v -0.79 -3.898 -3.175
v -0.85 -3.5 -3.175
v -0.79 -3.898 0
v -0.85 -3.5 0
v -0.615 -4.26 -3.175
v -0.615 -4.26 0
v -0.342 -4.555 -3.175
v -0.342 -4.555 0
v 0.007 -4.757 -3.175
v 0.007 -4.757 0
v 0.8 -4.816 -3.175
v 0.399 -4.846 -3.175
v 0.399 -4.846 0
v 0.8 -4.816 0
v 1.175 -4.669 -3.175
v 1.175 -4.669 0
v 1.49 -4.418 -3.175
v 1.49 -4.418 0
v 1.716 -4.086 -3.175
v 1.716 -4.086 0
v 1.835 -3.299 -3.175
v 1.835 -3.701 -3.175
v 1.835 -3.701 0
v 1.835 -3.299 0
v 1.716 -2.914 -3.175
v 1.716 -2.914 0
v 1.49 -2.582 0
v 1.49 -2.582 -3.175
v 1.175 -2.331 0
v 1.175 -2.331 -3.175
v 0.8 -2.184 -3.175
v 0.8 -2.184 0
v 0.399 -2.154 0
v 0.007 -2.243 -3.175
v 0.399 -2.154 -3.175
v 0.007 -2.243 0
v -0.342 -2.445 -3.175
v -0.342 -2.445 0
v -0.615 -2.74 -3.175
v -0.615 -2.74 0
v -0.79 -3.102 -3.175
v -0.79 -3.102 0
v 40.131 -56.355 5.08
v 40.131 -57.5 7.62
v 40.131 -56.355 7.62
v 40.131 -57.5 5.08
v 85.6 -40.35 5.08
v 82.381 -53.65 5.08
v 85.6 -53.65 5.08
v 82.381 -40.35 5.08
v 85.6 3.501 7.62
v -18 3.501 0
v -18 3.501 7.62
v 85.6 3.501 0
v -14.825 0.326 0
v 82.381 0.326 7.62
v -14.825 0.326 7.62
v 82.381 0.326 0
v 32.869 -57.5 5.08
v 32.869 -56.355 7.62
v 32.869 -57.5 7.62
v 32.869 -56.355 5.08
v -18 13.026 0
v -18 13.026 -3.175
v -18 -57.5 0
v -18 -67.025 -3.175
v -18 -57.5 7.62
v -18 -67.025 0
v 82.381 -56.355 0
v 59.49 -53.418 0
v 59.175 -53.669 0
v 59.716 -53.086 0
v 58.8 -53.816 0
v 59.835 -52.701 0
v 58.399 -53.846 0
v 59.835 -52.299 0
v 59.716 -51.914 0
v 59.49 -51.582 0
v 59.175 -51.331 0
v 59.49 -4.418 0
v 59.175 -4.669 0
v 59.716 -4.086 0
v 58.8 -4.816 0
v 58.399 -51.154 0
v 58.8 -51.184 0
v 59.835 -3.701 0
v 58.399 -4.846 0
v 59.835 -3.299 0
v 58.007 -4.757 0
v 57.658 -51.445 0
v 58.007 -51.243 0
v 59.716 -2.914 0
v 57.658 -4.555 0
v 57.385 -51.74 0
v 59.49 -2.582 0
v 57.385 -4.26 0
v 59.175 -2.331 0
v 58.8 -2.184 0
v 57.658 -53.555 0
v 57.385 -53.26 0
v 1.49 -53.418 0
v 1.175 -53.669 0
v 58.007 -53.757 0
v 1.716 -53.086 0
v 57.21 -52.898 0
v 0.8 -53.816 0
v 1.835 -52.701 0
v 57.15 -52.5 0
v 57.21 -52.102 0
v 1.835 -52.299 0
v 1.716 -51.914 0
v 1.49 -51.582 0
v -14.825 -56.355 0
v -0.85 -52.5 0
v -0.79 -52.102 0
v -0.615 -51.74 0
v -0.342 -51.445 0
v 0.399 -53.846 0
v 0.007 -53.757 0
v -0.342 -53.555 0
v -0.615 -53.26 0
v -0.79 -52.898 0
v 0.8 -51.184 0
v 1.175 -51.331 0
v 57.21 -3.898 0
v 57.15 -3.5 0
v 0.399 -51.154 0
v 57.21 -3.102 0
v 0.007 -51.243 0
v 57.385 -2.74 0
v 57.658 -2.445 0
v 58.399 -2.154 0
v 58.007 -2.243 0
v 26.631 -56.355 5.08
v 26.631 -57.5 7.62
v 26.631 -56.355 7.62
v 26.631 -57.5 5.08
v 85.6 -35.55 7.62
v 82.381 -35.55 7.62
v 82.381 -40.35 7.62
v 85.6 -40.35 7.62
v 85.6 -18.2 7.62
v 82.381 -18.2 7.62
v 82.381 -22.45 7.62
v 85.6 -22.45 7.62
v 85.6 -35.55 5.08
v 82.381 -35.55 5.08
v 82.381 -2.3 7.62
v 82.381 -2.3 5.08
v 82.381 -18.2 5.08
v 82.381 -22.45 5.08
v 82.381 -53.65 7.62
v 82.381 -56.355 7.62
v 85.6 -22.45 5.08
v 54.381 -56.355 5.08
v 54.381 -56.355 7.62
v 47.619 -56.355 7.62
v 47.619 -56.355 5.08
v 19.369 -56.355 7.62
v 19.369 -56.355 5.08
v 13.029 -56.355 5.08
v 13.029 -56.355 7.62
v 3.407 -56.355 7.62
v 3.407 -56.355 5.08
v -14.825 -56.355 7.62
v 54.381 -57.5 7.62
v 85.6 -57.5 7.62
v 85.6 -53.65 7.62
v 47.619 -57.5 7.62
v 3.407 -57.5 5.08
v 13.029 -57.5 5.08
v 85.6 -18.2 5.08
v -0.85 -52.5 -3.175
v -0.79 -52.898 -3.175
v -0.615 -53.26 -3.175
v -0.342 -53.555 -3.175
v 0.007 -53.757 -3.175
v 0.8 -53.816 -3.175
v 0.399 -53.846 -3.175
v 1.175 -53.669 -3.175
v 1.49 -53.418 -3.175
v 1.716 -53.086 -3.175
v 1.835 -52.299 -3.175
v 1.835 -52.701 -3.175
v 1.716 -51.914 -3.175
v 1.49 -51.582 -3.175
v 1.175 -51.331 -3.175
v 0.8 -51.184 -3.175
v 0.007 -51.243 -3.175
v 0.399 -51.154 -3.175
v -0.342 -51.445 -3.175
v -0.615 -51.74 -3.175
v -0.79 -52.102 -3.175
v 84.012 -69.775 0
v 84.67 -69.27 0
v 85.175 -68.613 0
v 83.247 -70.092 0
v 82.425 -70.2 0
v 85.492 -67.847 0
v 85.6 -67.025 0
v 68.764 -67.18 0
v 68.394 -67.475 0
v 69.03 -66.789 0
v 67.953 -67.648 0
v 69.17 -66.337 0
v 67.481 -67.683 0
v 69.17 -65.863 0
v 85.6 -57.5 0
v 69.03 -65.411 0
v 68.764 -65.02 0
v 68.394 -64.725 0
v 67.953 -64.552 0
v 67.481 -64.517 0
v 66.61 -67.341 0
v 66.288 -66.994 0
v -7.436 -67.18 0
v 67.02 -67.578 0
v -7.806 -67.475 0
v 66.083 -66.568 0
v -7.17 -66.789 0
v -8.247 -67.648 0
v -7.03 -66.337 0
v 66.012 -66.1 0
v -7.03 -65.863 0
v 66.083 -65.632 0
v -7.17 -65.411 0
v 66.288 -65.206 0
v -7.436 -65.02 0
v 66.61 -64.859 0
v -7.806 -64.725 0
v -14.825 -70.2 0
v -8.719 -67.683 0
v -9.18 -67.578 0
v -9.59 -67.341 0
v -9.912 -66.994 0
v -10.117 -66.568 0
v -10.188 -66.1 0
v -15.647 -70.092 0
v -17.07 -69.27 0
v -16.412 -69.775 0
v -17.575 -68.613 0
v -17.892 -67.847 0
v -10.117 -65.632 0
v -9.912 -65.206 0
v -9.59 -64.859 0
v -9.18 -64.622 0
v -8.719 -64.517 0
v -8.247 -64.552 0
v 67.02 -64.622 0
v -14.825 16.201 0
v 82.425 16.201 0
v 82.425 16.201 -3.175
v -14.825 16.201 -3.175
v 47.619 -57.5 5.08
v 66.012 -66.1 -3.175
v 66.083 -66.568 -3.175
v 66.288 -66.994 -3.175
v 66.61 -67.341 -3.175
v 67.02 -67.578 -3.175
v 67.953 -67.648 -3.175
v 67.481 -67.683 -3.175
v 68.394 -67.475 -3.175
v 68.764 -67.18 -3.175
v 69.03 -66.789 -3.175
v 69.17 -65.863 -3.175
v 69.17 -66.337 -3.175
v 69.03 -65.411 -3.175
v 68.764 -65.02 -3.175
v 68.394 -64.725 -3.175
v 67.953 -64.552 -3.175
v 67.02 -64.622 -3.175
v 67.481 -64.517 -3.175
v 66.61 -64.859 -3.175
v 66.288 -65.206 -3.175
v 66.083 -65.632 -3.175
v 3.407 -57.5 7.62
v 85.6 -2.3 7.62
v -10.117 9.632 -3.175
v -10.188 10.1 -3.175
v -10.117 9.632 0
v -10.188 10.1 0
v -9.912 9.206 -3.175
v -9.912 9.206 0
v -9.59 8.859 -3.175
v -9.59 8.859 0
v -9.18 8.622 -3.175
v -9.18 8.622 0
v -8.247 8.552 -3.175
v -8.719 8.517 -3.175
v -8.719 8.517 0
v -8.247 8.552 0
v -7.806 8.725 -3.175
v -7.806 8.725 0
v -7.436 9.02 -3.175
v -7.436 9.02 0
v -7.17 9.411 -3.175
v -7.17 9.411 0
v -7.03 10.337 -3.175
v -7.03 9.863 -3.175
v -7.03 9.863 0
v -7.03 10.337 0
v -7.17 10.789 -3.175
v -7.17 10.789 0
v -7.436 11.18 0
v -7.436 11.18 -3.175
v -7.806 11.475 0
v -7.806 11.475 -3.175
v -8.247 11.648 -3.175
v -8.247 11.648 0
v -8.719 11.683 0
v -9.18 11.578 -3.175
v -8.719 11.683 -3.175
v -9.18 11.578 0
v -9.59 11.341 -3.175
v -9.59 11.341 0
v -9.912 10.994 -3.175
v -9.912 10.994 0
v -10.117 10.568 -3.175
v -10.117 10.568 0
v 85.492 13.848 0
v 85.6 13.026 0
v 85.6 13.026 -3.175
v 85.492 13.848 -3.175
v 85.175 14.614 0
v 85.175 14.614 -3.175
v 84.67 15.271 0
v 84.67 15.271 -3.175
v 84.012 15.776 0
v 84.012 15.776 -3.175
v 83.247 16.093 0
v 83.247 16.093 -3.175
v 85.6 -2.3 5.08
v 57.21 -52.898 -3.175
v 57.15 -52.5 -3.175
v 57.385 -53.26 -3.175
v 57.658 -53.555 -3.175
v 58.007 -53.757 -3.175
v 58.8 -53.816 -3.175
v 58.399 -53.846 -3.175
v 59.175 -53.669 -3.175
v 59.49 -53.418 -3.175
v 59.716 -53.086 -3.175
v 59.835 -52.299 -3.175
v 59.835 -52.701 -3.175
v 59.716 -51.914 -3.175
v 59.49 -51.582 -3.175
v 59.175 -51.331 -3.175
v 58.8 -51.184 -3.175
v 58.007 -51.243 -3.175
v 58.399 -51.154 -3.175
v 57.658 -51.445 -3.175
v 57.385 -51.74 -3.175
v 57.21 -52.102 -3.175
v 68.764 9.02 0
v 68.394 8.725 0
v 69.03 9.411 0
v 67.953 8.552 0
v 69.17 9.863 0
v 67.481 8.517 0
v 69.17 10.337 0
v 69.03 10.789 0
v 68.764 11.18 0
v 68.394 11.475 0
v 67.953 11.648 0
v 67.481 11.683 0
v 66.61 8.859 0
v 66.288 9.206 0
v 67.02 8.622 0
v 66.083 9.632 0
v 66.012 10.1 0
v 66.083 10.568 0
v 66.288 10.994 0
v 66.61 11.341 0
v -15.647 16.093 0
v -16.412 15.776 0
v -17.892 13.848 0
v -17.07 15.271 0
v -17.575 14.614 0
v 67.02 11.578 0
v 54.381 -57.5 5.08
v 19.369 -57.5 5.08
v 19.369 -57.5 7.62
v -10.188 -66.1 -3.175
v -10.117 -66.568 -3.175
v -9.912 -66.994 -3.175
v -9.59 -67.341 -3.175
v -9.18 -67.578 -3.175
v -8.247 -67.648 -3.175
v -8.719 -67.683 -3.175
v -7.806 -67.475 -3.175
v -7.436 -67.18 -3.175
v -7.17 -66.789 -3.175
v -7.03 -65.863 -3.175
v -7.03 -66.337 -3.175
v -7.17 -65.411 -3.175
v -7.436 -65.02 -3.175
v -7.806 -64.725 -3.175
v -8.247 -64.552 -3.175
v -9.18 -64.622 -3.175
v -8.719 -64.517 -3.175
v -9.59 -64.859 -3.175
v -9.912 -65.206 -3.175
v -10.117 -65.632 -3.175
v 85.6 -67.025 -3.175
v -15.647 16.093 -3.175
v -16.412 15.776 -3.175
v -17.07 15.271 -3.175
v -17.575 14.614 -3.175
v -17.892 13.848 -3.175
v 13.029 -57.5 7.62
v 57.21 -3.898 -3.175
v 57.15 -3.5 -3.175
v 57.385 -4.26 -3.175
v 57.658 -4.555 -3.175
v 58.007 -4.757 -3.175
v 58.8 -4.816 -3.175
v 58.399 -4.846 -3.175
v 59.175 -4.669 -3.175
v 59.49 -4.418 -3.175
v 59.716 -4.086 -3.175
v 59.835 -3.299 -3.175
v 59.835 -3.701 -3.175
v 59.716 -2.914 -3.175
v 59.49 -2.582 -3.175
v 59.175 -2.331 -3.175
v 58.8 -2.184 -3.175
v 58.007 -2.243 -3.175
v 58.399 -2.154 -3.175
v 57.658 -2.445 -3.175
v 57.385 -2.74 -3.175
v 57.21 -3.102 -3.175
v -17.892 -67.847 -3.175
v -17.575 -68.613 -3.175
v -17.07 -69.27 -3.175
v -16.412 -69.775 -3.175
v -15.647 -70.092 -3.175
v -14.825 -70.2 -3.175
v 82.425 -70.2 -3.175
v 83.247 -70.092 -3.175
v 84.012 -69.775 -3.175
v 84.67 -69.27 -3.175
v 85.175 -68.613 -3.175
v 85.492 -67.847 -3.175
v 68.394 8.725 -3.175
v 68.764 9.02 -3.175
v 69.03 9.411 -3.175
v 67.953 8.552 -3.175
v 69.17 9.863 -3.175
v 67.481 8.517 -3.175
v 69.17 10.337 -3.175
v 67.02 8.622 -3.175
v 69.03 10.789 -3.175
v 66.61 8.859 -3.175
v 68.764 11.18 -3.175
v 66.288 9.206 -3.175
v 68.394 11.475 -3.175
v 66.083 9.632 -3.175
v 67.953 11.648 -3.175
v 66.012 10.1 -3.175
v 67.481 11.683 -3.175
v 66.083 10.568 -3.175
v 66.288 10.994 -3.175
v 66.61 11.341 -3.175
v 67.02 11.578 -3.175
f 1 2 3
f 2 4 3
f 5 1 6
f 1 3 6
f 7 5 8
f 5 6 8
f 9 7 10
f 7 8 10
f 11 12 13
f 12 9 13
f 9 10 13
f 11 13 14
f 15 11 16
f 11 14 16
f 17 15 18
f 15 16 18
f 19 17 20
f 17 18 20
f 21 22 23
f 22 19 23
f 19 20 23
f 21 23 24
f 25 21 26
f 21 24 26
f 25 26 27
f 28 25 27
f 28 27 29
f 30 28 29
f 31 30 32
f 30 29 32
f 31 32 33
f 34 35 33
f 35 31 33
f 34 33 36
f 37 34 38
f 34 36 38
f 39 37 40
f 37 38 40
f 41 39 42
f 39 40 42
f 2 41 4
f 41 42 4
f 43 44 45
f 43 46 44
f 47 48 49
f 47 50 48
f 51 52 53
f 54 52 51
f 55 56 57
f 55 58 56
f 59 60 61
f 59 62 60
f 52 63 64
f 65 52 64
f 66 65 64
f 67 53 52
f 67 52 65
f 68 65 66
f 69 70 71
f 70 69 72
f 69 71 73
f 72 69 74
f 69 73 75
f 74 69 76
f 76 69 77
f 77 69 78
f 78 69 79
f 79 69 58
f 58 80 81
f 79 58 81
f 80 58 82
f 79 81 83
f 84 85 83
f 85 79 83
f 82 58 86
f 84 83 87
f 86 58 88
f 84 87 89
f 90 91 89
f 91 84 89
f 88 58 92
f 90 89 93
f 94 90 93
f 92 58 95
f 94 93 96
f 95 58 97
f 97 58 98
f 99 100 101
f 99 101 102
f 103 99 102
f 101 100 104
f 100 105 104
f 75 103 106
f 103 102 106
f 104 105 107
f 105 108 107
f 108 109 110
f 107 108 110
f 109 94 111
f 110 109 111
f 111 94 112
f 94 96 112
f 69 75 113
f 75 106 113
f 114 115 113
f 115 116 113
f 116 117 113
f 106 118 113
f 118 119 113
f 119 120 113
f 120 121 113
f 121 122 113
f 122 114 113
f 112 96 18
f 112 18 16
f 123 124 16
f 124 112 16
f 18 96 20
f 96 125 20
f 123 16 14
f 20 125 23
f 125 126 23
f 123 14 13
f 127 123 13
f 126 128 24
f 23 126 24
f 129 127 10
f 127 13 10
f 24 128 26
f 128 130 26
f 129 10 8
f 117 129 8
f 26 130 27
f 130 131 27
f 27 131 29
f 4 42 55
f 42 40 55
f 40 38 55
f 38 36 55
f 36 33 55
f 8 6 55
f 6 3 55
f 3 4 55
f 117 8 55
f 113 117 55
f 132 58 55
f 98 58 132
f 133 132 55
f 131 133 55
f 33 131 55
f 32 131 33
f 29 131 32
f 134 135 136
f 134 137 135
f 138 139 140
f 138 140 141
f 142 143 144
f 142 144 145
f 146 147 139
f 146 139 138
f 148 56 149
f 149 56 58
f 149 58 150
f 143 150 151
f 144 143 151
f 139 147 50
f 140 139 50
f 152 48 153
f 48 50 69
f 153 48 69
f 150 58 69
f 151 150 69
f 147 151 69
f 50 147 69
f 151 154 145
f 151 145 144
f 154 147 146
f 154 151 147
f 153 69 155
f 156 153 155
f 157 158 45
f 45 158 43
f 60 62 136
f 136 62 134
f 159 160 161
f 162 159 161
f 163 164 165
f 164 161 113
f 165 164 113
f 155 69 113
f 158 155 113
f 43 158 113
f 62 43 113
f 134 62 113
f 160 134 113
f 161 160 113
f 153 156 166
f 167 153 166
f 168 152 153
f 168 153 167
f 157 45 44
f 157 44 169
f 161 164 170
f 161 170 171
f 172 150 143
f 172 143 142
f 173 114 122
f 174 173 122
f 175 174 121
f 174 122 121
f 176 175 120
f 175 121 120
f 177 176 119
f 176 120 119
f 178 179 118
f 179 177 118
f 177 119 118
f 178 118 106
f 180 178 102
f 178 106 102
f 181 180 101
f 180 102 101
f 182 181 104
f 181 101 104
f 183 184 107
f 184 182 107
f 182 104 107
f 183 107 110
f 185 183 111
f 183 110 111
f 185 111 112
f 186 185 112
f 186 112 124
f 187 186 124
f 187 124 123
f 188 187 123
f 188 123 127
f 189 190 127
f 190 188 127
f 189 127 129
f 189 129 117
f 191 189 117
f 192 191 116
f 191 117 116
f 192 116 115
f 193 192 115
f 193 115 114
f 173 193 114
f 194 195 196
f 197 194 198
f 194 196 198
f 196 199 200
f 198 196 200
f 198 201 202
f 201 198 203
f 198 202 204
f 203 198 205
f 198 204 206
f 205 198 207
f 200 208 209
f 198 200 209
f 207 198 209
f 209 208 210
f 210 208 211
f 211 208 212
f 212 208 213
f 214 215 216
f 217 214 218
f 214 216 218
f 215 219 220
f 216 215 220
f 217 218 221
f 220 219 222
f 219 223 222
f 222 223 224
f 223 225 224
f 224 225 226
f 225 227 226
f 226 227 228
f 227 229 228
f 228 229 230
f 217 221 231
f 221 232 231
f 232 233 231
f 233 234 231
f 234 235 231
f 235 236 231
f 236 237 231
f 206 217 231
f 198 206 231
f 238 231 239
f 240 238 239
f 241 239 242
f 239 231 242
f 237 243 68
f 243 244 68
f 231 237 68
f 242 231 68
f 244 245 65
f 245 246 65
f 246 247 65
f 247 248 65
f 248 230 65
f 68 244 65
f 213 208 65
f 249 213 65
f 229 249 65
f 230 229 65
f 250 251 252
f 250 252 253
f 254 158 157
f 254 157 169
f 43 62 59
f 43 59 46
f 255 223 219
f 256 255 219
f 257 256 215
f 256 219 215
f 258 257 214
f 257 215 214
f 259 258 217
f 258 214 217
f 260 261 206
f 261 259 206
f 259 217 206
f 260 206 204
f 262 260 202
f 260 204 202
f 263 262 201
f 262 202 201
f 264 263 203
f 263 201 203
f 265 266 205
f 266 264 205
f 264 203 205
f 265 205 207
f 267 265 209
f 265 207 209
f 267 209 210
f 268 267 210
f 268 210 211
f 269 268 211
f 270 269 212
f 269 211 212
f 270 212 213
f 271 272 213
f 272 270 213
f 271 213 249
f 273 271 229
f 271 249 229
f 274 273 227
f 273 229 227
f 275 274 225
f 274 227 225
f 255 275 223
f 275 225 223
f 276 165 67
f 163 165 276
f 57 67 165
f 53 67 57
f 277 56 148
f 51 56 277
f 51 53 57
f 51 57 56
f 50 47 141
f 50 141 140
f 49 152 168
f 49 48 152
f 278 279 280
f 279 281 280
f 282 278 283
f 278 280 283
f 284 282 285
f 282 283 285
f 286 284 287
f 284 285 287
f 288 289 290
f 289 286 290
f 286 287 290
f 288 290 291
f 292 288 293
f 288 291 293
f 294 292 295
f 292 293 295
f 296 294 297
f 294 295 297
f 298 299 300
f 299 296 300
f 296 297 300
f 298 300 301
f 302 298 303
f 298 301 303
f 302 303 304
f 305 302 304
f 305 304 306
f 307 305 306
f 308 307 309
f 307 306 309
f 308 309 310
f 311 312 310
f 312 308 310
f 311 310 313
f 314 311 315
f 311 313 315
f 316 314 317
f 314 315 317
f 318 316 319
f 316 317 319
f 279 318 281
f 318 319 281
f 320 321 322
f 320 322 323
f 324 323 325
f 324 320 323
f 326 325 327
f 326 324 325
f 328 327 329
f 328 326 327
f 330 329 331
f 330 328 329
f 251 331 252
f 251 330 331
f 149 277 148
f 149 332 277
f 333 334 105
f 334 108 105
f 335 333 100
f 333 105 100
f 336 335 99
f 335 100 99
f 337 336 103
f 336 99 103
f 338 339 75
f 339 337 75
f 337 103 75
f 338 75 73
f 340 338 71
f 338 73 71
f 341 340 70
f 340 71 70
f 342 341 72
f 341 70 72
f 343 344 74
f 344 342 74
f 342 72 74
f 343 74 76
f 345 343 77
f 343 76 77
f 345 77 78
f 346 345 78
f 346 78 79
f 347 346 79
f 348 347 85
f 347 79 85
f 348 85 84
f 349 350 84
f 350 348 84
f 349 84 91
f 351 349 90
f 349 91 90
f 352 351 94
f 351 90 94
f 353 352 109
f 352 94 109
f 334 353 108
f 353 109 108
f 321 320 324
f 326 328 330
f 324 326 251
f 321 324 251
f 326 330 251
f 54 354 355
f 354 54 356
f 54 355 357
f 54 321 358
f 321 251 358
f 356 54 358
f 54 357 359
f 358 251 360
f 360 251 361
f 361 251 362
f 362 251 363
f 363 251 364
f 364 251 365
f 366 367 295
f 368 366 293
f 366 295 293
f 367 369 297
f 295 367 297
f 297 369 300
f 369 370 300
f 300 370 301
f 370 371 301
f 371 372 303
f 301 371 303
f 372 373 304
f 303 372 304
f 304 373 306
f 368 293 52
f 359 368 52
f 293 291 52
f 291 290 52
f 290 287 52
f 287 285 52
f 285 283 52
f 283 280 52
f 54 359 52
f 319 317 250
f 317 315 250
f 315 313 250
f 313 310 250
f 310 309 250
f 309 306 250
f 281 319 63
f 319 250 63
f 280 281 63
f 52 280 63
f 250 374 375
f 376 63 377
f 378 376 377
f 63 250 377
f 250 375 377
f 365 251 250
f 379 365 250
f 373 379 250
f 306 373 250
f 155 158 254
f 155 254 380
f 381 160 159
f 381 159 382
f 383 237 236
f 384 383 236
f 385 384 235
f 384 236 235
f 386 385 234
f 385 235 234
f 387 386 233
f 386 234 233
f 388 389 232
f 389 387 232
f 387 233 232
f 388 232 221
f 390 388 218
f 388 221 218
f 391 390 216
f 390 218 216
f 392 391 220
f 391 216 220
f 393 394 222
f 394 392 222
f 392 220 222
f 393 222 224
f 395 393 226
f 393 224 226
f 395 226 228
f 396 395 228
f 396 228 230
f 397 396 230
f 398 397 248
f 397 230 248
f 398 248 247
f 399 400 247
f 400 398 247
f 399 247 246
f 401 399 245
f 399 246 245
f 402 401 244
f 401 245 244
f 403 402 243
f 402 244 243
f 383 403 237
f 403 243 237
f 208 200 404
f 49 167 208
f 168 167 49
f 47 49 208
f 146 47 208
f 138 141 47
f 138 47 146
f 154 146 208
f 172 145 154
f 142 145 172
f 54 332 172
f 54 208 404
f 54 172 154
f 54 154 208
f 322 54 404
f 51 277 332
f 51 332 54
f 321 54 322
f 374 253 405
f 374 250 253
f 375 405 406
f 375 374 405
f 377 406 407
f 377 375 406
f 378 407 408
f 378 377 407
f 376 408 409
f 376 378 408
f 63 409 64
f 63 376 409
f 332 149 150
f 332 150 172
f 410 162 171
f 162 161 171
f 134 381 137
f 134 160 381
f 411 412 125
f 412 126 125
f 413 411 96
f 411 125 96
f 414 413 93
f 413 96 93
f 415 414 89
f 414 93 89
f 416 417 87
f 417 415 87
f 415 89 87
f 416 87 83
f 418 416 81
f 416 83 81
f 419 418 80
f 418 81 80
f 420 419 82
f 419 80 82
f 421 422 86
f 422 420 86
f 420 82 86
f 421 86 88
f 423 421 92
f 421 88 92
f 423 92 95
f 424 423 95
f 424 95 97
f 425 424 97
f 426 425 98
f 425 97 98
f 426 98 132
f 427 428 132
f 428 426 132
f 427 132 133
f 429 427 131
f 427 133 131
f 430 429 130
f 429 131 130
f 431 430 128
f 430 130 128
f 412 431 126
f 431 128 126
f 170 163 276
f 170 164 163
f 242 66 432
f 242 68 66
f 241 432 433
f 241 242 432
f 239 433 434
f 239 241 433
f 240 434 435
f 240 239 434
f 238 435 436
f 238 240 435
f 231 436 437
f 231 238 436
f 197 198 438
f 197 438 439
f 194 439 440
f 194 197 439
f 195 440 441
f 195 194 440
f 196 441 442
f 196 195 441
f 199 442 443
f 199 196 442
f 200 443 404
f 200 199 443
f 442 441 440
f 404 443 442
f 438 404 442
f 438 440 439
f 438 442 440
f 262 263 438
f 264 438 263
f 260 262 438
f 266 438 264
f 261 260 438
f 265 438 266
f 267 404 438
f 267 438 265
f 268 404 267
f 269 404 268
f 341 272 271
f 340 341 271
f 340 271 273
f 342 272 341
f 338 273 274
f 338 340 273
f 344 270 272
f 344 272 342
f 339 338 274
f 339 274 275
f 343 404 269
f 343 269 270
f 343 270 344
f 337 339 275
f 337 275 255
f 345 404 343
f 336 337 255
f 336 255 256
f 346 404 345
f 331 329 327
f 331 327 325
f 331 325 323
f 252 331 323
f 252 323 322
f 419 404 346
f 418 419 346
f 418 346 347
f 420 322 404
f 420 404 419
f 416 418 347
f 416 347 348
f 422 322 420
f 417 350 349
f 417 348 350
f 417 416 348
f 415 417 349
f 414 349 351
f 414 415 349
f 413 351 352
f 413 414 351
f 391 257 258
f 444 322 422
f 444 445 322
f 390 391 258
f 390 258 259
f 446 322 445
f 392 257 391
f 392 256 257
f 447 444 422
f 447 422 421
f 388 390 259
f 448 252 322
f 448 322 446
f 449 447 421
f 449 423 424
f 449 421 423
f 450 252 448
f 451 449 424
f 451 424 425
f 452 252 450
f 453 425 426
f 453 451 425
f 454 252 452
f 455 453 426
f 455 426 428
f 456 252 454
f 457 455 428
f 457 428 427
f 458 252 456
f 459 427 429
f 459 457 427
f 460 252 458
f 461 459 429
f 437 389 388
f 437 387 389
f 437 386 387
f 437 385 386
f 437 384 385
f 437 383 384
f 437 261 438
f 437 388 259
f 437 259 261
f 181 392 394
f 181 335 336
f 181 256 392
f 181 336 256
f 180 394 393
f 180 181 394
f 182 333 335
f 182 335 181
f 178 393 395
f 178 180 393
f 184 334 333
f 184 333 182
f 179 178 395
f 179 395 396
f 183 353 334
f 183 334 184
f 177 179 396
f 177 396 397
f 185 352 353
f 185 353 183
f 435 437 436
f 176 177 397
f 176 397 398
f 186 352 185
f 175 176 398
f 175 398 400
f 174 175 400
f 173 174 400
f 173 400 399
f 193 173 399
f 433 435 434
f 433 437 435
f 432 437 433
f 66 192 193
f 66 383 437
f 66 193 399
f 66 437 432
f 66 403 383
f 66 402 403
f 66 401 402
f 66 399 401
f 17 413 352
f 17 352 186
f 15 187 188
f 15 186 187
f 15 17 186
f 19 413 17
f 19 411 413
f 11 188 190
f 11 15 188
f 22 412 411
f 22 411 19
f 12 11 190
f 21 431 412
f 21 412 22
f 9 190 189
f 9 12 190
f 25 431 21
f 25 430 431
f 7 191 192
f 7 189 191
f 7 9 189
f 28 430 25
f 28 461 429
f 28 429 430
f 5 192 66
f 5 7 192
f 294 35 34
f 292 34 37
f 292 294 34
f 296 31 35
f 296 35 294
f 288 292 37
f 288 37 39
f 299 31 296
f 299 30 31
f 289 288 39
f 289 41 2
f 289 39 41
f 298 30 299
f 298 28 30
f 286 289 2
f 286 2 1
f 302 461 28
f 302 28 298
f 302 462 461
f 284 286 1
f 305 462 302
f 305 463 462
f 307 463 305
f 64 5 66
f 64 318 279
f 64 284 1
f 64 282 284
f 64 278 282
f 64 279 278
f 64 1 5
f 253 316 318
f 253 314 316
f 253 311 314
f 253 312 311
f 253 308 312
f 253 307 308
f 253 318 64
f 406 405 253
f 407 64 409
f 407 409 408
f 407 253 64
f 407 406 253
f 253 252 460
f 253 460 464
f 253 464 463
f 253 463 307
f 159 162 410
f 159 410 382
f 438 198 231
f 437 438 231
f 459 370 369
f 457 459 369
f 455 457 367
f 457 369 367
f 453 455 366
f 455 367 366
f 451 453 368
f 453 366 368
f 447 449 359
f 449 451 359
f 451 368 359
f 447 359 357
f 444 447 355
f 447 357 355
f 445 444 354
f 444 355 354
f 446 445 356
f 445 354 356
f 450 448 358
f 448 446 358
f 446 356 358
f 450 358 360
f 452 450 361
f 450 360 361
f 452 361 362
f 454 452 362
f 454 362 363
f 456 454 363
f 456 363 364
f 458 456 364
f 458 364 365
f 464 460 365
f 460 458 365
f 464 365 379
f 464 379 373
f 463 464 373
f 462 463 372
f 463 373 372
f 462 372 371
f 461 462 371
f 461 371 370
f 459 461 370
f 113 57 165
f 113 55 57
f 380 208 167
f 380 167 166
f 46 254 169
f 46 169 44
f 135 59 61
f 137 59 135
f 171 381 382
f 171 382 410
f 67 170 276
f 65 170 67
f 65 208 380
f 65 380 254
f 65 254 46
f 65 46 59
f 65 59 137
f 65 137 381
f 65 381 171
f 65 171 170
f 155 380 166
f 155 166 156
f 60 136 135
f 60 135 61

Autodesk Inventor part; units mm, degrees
ref_plane "YZ Plane" through (0, 0, 0) normal (1, 0, 0) x (0, 1, 0)
ref_plane "XZ Plane" through (0, 0, 0) normal (0, 1, 0) x (-1, 0, 0)
ref_plane "XY Plane" through (0, 0, 0) normal (0, 0, 1) x (1, 0, 0)
sketch "0" plane through (0, 0, 0) normal (0, 0, 1) x (1, 0, 0)
  line L0 (79, 0) -> (0, 0)
  arc A0 (0, 0) -> (-3, -3) centre (0, -3) ccw
  line L1 (-3, -3) -> (-3, -53)
  arc A1 (-3, -53) -> (0, -56) centre (0, -53) ccw
  line L2 (0, -56) -> (79, -56)
  arc A2 (79, -56) -> (82, -53) centre (79, -53) ccw
  line L3 (82, -53) -> (82, -3)
  arc A3 (82, -3) -> (79, 0) centre (79, -3) ccw
  circle A4 centre (0.5, -3.5) radius 1.35
  circle A5 centre (0.5, -52.5) radius 1.35
  line L4 (3.73, -49.89) -> (3.73, -57.5)
  line L5 (12.67, -57.5) -> (12.67, -49.89)
  line L6 (5.03, -57.5) -> (11.37, -57.5)
  line L7 (19.75, -50.3) -> (19.75, -57.8)
  line L8 (26.25, -57.8) -> (26.25, -50.3)
  line L9 (20.2, -57.8) -> (25.8, -57.8)
  line L10 (33.25, -50.3) -> (33.25, -57.8)
  line L11 (39.75, -57.8) -> (39.75, -50.3)
  line L12 (33.7, -57.8) -> (39.3, -57.8)
  line L13 (54, -55.9) -> (54, -58.1)
  line L14 (48, -55.9) -> (48, -58.1)
  line L15 (48.3, -58.4) -> (53.7, -58.4)
  line L16 (68.53, -53.65) -> (85, -53.65)
  line L17 (85, -53.35) -> (85, -40.65)
  line L18 (85, -40.35) -> (68.53, -40.35)
  line L19 (68.44, -22.45) -> (85, -22.45)
  line L20 (85.6, -23.75) -> (85.6, -34.25)
  line L21 (68.44, -35.55) -> (85, -35.55)
  line L22 (84.8, -2.3) -> (63.85, -2.3)
  line L23 (85, -18) -> (85, -2.5)
  line L24 (63.85, -18.2) -> (84.8, -18.2)
  circle A6 centre (58.5, -3.5) radius 1.35
  circle A7 centre (58.5, -52.5) radius 1.35
  line L25 (3.73, -57.5) -> (12.67, -57.5)
  line L26 (19.75, -57.8) -> (26.25, -57.8)
  line L27 (33.25, -57.8) -> (39.75, -57.8)
  line L28 (54, -58.1) -> (53.7, -58.4)
  line L29 (48.3, -58.4) -> (48, -58.1)
  line L30 (85, -53.65) -> (85, -40.35)
  line L31 (85, -35.55) -> (85.6, -35.55)
  line L32 (85.6, -35.55) -> (85.6, -22.45)
  line L33 (85.6, -22.45) -> (85, -22.45)
  line L34 (84.8, -18.2) -> (85, -18.2)
  line L35 (85, -18.2) -> (85, -2.3)
  line L36 (85, -2.3) -> (84.8, -2.3)
  line L37 (84.8, -2.3) -> (84.8, -18.2)
  line L38 (-3, -28) -> (-18, -28)
  line L39 (3.73, -57.5) -> (-18, -57.5)
  line L40 (-18, -57.5) -> (85.6, -57.5)
  line L41 (79, 0.3263) -> (0, 0.3263)
  line L42 (39.5, 0.3263) -> (39.5, 3.5013)
  line L43 (0, -56.3549) -> (79, -56.3549)
  line L44 (3.4071, -49.89) -> (3.4071, -57.5)
  line L45 (13.029, -49.89) -> (13.029, -57.859)
  line L46 (13.029, -57.859) -> (3.73, -57.859)
  line L47 (19.369, -50.3) -> (19.369, -58.181)
  line L48 (19.369, -58.181) -> (26.631, -58.181)
  line L49 (26.631, -58.181) -> (26.631, -50.3)
  line L50 (32.869, -50.3) -> (32.869, -58.181)
  line L51 (32.869, -58.181) -> (40.131, -58.181)
  line L52 (40.131, -58.181) -> (40.131, -50.3)
  line L53 (47.619, -55.9) -> (47.619, -58.2578)
  line L54 (47.619, -58.2578) -> (48.1422, -58.781)
  line L55 (48.1422, -58.781) -> (53.8578, -58.781)
  line L56 (53.8578, -58.781) -> (54.381, -58.2578)
  line L57 (54.381, -58.2578) -> (54.381, -55.9)
  line L58 (82.381, -53) -> (82.381, -3)
  line L59 (-3.381, -3) -> (-3.381, -53)
  line L60 (-18, -57.5) -> (39.5, -57.5)
  line L61 (39.5, -57.5) -> (39.5, 3.5013) construction
  line L62 (39.5, 3.5013) -> (-18, 3.5013)
  line L63 (-18, 3.5013) -> (-18, -57.5)
  line L64 (39.5, 3.5013) -> (85.6, 3.5013)
  line L65 (85.6, 3.5013) -> (85.6, -57.5)
  line L66 (85.6, -57.5) -> (39.5, -57.5)
  line L67 (39.5, -57.5) -> (39.5, 3.5013) construction
  line L68 (-3.381, -3) -> (0, -3)
  line L69 (0, -3) -> (0, 0.3263)
  line L70 (0, 0.3263) -> (-3.381, 0.3263)
  line L71 (-3.381, 0.3263) -> (-3.381, -3)
  line L72 (79, 0.3263) -> (82.381, 0.3263)
  line L73 (82.381, 0.3263) -> (82.381, -3)
  line L74 (82.381, -3) -> (79, -3)
  line L75 (79, -3) -> (79, 0.3263)
  line L76 (79, -56.3549) -> (82.381, -56.3549)
  line L77 (82.381, -56.3549) -> (82.381, -53)
  line L78 (82.381, -53) -> (79, -53)
  line L79 (79, -53) -> (79, -56.3549)
  line L80 (-3.381, -53) -> (0, -53)
  line L81 (0, -53) -> (0, -56.3549)
  line L82 (0, -56.3549) -> (-3.381, -56.3549)
  line L83 (-3.381, -56.3549) -> (-3.381, -53)
  line L84 (85, -53.65) -> (85.6, -53.65)
  line L85 (85.6, -53.65) -> (85.6, -40.35)
  line L86 (85.6, -40.35) -> (85, -40.35)
  line L87 (85, -40.35) -> (85, -53.65)
  line L88 (85, -18.2) -> (85.6, -18.2)
  line L89 (85.6, -18.2) -> (85.6, -2.3)
  line L90 (85.6, -2.3) -> (85, -2.3)
  line L91 (85, -2.3) -> (85, -18.2)
  line L92 (-18, -28) -> (-14.825, -28)
  line L93 (-14.825, -28) -> (-3.381, -28)
  line L94 (-3.381, -28) -> (-3.381, 0.3263)
  line L95 (-3.381, 0.3263) -> (-14.825, 0.3263)
  line L96 (-14.825, 0.3263) -> (-14.825, -28)
  line L97 (-14.825, -28) -> (-3.381, -28)
  line L98 (-3.381, -28) -> (-3.381, -56.3549)
  line L99 (-3.381, -56.3549) -> (-14.825, -56.3549)
  line L100 (-14.825, -56.3549) -> (-14.825, -28)
  point P0 (19.369, -57.5)
  point P1 (19.369, -56.3549)
  point P2 (13.029, -56.3549)
  point P3 (13.029, -57.5)
  point P4 (32.869, -57.5)
  point P5 (32.869, -56.3549)
  point P6 (26.631, -56.3549)
  point P7 (26.631, -57.5)
  point P8 (47.619, -57.5)
  point P9 (47.619, -56.3549)
  point P10 (40.131, -56.3549)
  point P11 (40.131, -57.5)
  point P12 (54.381, -56.3549)
  point P13 (54.381, -57.5)
  point P14 (82.381, -53.65)
  point P15 (82.381, -35.55)
  point P16 (82.381, -40.35)
  point P17 (82.381, -18.2)
  point P18 (82.381, -22.45)
  point P19 (82.381, -2.3)
  point P20 (3.4071, -56.3549)
  dimension "d0" = 15
  dimension "d2" = 3.175
  dimension "d3" = 0.381
  dimension "d4" = 0.381
  dimension "d5" = 0.381
  dimension "d6" = 0.381
  dimension "d7" = 0.381
  dimension "d8" = 3.175
extrude "Extrusion1" add sketch "0" along normal blind 7.62 contours L41 L42 L64 L65 L90 L36 L22 L73 L72 | L70 L95 L96 L38 L63 L62 L42 L41 | L69 L68 A4 | A4 L68 L69 | L24 L34 L88 L65 L33 L19 L58 | L80 L81 A5 | A5 L81 L80 | L100 L99 L82 L43 L44 L39 L63 L38 | L21 L31 L65 L86 L18 L58 | L16 L84 L65 L40 L57 L43 L76 L77 | L43 L47 L40 L45 | L43 L50 L40 L49 | L53 L40 L52 L43 | A6 | A7
sketch "Sketch3" plane through (0, 0, 0) normal (0, 0, -1) x (-1, 0, 0)
  line L0 (-85.6, 3.5013) -> (18, 3.5013) projected
  line L1 (-54.381, -57.5) -> (-85.6, -57.5) projected
  line L2 (18, 3.5013) -> (-85.6, 3.5013)
  line L3 (-85.6, 3.5013) -> (-85.6, -57.5)
  line L4 (-85.6, -57.5) -> (18, -57.5)
  line L5 (18, -57.5) -> (18, 3.5013)
  circle A0 centre (-0.5, -3.5) radius 1.35 projected
  circle A1 centre (-0.5, -52.5) radius 1.35 projected
  circle A2 centre (-58.5, -52.5) radius 1.35 projected
  circle A3 centre (-58.5, -3.5) radius 1.35 projected
  line L6 (18, -57.5) -> (-85.6, -57.5)
  line L7 (-85.6, -57.5) -> (-85.6, -67.025)
  line L8 (-82.425, -70.2) -> (14.825, -70.2)
  line L9 (18, -67.025) -> (18, -57.5)
  line L10 (18, 3.5013) -> (-85.6, 3.5013)
  line L11 (-85.6, 3.5013) -> (-85.6, 13.0263)
  line L12 (-82.425, 16.2013) -> (14.825, 16.2013)
  line L13 (18, 13.0263) -> (18, 3.5013)
  arc A4 (18, 13.0263) -> (14.825, 16.2013) centre (14.825, 13.0263) ccw
  arc A5 (-82.425, 16.2013) -> (-85.6, 13.0263) centre (-82.425, 13.0263) ccw
  line L14 (-0.5, -52.5) -> (-58.5, -3.5) construction
  line L15 (-58.5, -3.5) -> (-58.5, -52.5) construction
  line L16 (-58.5, -52.5) -> (-0.5, -3.5) construction
  arc A6 (14.825, -70.2) -> (18, -67.025) centre (14.825, -67.025) ccw
  arc A7 (-85.6, -67.025) -> (-82.425, -70.2) centre (-82.425, -67.025) ccw
  line L17 (-29.5, -28) -> (-29.5, -66.1) construction
  line L18 (-29.5, -66.1) -> (-29.5, 10.1) construction
  line L19 (-29.5, 10.1) -> (8.6, 10.1) construction
  line L20 (8.6, 10.1) -> (-67.6, 10.1) construction
  line L21 (-29.5, -66.1) -> (8.6, -66.1) construction
  line L22 (8.6, -66.1) -> (-67.6, -66.1) construction
  circle A8 centre (8.6, -66.1) radius 1.5875
  circle A9 centre (-67.6, -66.1) radius 1.5875
  circle A10 centre (-67.6, 10.1) radius 1.5875
  circle A11 centre (8.6, 10.1) radius 1.5875
  point P0 (0, 0)
  point P1 (-85.6, -70.2)
  point P2 (-85.6, 16.2013)
  dimension "d11" = 12.7
  dimension "d12" = 12.7
  dimension "d13" = 3.175
  dimension "d14" = 3.175
  dimension "d15" = 38.1
  dimension "d16" = 76.2
  dimension "d17" = 38.1
  dimension "d18" = 76.2
  dimension "d19" = 38.1
  dimension "d20" = 76.2
  dimension "d21" = 3.175
  dimension "d22" = 3.175
  dimension "d23" = 3.175
  dimension "d24" = 3.175
extrude "Extrusion2" add sketch "Sketch3" along normal blind 3.175
sketch "Sketch4" plane through (0.5, -52.5, 7.62) normal (0, 0, 1) x (1, 0, 0)
  circle A0 centre (0, 49) radius 1.35 projected
  circle A1 centre (0, 0) radius 1.35 projected
  circle A2 centre (58, 0) radius 1.35 projected
  circle A3 centre (58, 49) radius 1.35 projected
  point P0 (-0.5, 52.5)
extrude "Extrusion3" cut sketch "Sketch4" against normal through all
sketch "Sketch6" plane through (0, 0, 0) normal (0, 0, 1) x (1, 0, 0)
  circle A0 centre (-8.6, -66.1) radius 1.5875 projected
  circle A1 centre (67.6, -66.1) radius 1.5875 projected
  circle A2 centre (58.5, -3.5) radius 1.35 projected
  circle A3 centre (58.5, -52.5) radius 1.35 projected
  circle A4 centre (0.5, -52.5) radius 1.35 projected
  circle A5 centre (0.5, -3.5) radius 1.35 projected
  line L0 (47.619, -57.5) -> (47.619, -56.3549) projected
  line L1 (40.131, -57.5) -> (47.619, -57.5) projected
  line L2 (40.131, -56.3549) -> (40.131, -57.5) projected
  line L3 (47.619, -56.3549) -> (40.131, -56.3549) projected
  line L4 (32.869, -57.5) -> (32.869, -56.3549) projected
  line L5 (26.631, -57.5) -> (32.869, -57.5) projected
  line L6 (26.631, -56.3549) -> (26.631, -57.5) projected
  line L7 (32.869, -56.3549) -> (26.631, -56.3549) projected
  line L8 (19.369, -57.5) -> (19.369, -56.3549) projected
  line L9 (13.029, -57.5) -> (19.369, -57.5) projected
  line L10 (13.029, -56.3549) -> (13.029, -57.5) projected
  line L11 (19.369, -56.3549) -> (13.029, -56.3549) projected
  line L12 (85.6, -35.55) -> (82.381, -35.55) projected
  line L13 (85.6, -22.45) -> (85.6, -35.55) projected
  line L14 (82.381, -22.45) -> (85.6, -22.45) projected
  line L15 (82.381, -18.2) -> (82.381, -22.45) projected
  line L16 (85.6, -18.2) -> (82.381, -18.2) projected
  line L17 (85.6, -2.3) -> (85.6, -18.2) projected
  line L18 (82.381, -2.3) -> (85.6, -2.3) projected
  line L19 (82.381, 0.3263) -> (82.381, -2.3) projected
  line L20 (-14.825, 0.3263) -> (82.381, 0.3263) projected
  line L21 (-14.825, -56.3549) -> (-14.825, 0.3263) projected
  line L22 (3.4071, -56.3549) -> (-14.825, -56.3549) projected
  line L23 (3.4071, -57.5) -> (3.4071, -56.3549) projected
  line L24 (-18, -57.5) -> (3.4071, -57.5) projected
  line L25 (-18, -67.025) -> (-18, -57.5) projected
  arc A6 (-18, -67.025) -> (-14.825, -70.2) centre (-14.825, -67.025) ccw projected
  line L26 (82.425, -70.2) -> (-14.825, -70.2) projected
  arc A7 (82.425, -70.2) -> (85.6, -67.025) centre (82.425, -67.025) ccw projected
  line L27 (85.6, -57.5) -> (85.6, -67.025) projected
  line L28 (54.381, -57.5) -> (85.6, -57.5) projected
  line L29 (54.381, -56.3549) -> (54.381, -57.5) projected
  line L30 (82.381, -56.3549) -> (54.381, -56.3549) projected
  line L31 (82.381, -53.65) -> (82.381, -56.3549) projected
  line L32 (85.6, -53.65) -> (82.381, -53.65) projected
  line L33 (85.6, -40.35) -> (85.6, -53.65) projected
  line L34 (82.381, -40.35) -> (85.6, -40.35) projected
  line L35 (82.381, -35.55) -> (82.381, -40.35) projected
  line L36 (3.4071, -57.5) -> (13.029, -57.5)
  line L37 (13.029, -57.5) -> (13.029, -56.3549)
  line L38 (13.029, -56.3549) -> (3.4071, -56.3549)
  line L39 (3.4071, -56.3549) -> (3.4071, -57.5)
  line L40 (19.369, -57.5) -> (26.631, -57.5)
  line L41 (26.631, -57.5) -> (26.631, -56.3549)
  line L42 (26.631, -56.3549) -> (19.369, -56.3549)
  line L43 (19.369, -56.3549) -> (19.369, -57.5)
  line L44 (32.869, -57.5) -> (40.131, -57.5)
  line L45 (40.131, -57.5) -> (40.131, -56.3549)
  line L46 (40.131, -56.3549) -> (32.869, -56.3549)
  line L47 (32.869, -56.3549) -> (32.869, -57.5)
  line L48 (47.619, -57.5) -> (54.381, -57.5)
  line L49 (54.381, -57.5) -> (54.381, -56.3549)
  line L50 (54.381, -56.3549) -> (47.619, -56.3549)
  line L51 (47.619, -56.3549) -> (47.619, -57.5)
  line L52 (85.6, -53.65) -> (82.381, -53.65)
  line L53 (82.381, -53.65) -> (82.381, -40.35)
  line L54 (82.381, -40.35) -> (85.6, -40.35)
  line L55 (85.6, -40.35) -> (85.6, -53.65)
  line L56 (82.381, -35.55) -> (85.6, -35.55)
  line L57 (85.6, -35.55) -> (85.6, -22.45)
  line L58 (85.6, -22.45) -> (82.381, -22.45)
  line L59 (82.381, -22.45) -> (82.381, -35.55)
  line L60 (85.6, -18.2) -> (82.381, -18.2)
  line L61 (82.381, -18.2) -> (82.381, -2.3)
  line L62 (82.381, -2.3) -> (85.6, -2.3)
  line L63 (85.6, -2.3) -> (85.6, -18.2)
  point P0 (0, 0)
extrude "Extrusion4" add sketch "Sketch6" along normal blind 5.08 contours L0 L50 L29 L48 | L44 L4 L46 L2 | L40 L8 L42 L6 | L53 L34 L33 L32 | L36 L23 L38 L10 | L59 L14 L13 L12 | L61 L18 L17 L16
sketch "Sketch7" plane through (0, 0, 7.62) normal (0, 0, 1) x (1, 0, 0)
  line L0 (-14.825, -56.3549) -> (-14.825, 0.3263) projected
  line L1 (-14.825, 0.3263) -> (82.381, 0.3263) projected
  line L2 (82.381, 0.3263) -> (82.381, -2.3) projected
  line L3 (82.381, -2.3) -> (85.6, -2.3) projected
  line L4 (85.6, -2.3) -> (85.6, 3.5013) projected
  line L5 (85.6, 3.5013) -> (-18, 3.5013) projected
  line L6 (-18, 3.5013) -> (-18, -57.5) projected
  line L7 (-18, -57.5) -> (3.4071, -57.5) projected
  line L8 (3.4071, -57.5) -> (3.4071, -56.3549) projected
  line L9 (3.4071, -56.3549) -> (-14.825, -56.3549) projected
  line L10 (82.381, -56.3549) -> (-14.825, -56.3549) projected
  line L11 (82.381, 0.3263) -> (82.381, -56.3549) projected
  line L12 (-14.825, 0.3263) -> (82.381, 0.3263) projected
  line L13 (-14.825, -56.3549) -> (-14.825, 0.3263) projected
  circle A0 centre (58.5, -3.5) radius 1.35 projected
  circle A1 centre (58.5, -52.5) radius 1.35 projected
  circle A2 centre (0.5, -52.5) radius 1.35 projected
  circle A3 centre (0.5, -3.5) radius 1.35 projected
  line L14 (13.029, -56.3549) -> (13.029, -57.5) projected
  line L15 (13.029, -56.3549) -> (3.4071, -56.3549) projected
  line L16 (3.4071, -57.5) -> (3.4071, -56.3549) projected
  line L17 (3.4071, -57.5) -> (13.029, -57.5) projected
  line L18 (19.369, -56.3549) -> (13.029, -56.3549) projected
  line L19 (13.029, -56.3549) -> (13.029, -57.5) projected
  line L20 (13.029, -57.5) -> (19.369, -57.5) projected
  line L21 (19.369, -57.5) -> (19.369, -56.3549) projected
  line L22 (26.631, -56.3549) -> (26.631, -57.5) projected
  line L23 (26.631, -56.3549) -> (19.369, -56.3549) projected
  line L24 (19.369, -57.5) -> (19.369, -56.3549) projected
  line L25 (19.369, -57.5) -> (26.631, -57.5) projected
  line L26 (26.631, -57.5) -> (32.869, -57.5) projected
  line L27 (32.869, -56.3549) -> (26.631, -56.3549) projected
  line L28 (26.631, -56.3549) -> (26.631, -57.5) projected
  line L29 (26.631, -57.5) -> (32.869, -57.5) projected
  line L30 (32.869, -57.5) -> (32.869, -56.3549) projected
  line L31 (40.131, -56.3549) -> (40.131, -57.5) projected
  line L32 (40.131, -56.3549) -> (32.869, -56.3549) projected
  line L33 (32.869, -57.5) -> (32.869, -56.3549) projected
  line L34 (32.869, -57.5) -> (40.131, -57.5) projected
  line L35 (47.619, -56.3549) -> (40.131, -56.3549) projected
  line L36 (40.131, -56.3549) -> (40.131, -57.5) projected
  line L37 (40.131, -57.5) -> (47.619, -57.5) projected
  line L38 (47.619, -57.5) -> (47.619, -56.3549) projected
  line L39 (54.381, -56.3549) -> (54.381, -57.5) projected
  line L40 (54.381, -56.3549) -> (47.619, -56.3549) projected
  line L41 (47.619, -57.5) -> (47.619, -56.3549) projected
  line L42 (47.619, -57.5) -> (54.381, -57.5) projected
  line L43 (82.381, -56.3549) -> (54.381, -56.3549) projected
  line L44 (54.381, -56.3549) -> (54.381, -57.5) projected
  line L45 (54.381, -57.5) -> (85.6, -57.5) projected
  line L46 (85.6, -57.5) -> (85.6, -53.65) projected
  line L47 (85.6, -53.65) -> (82.381, -53.65) projected
  line L48 (82.381, -53.65) -> (82.381, -56.3549) projected
  line L49 (85.6, -53.65) -> (82.381, -53.65) projected
  line L50 (85.6, -53.65) -> (85.6, -40.35) projected
  line L51 (82.381, -40.35) -> (85.6, -40.35) projected
  line L52 (82.381, -40.35) -> (82.381, -53.65) projected
  line L53 (85.6, -35.55) -> (82.381, -35.55) projected
  line L54 (85.6, -35.55) -> (85.6, -22.45) projected
  line L55 (82.381, -22.45) -> (85.6, -22.45) projected
  line L56 (82.381, -22.45) -> (82.381, -35.55) projected
  line L57 (85.6, -18.2) -> (85.6, -2.3) projected
  line L58 (85.6, -18.2) -> (82.381, -18.2) projected
  line L59 (85.6, -18.2) -> (85.6, -2.3) projected
  line L60 (82.381, -2.3) -> (85.6, -2.3) projected
  line L61 (82.381, -2.3) -> (82.381, -18.2) projected
  line L62 (85.6, -18.2) -> (82.381, -18.2) projected
  line L63 (82.381, -18.2) -> (82.381, -22.45) projected
  line L64 (82.381, -22.45) -> (85.6, -22.45) projected
  line L65 (85.6, -22.45) -> (85.6, -18.2) projected
  line L66 (85.6, -40.35) -> (85.6, -35.55) projected
  line L67 (85.6, -35.55) -> (82.381, -35.55) projected
  line L68 (82.381, -35.55) -> (82.381, -40.35) projected
  line L69 (82.381, -40.35) -> (85.6, -40.35) projected
  point P0 (0, 0)
properties part number "RPIcaseBottom"
